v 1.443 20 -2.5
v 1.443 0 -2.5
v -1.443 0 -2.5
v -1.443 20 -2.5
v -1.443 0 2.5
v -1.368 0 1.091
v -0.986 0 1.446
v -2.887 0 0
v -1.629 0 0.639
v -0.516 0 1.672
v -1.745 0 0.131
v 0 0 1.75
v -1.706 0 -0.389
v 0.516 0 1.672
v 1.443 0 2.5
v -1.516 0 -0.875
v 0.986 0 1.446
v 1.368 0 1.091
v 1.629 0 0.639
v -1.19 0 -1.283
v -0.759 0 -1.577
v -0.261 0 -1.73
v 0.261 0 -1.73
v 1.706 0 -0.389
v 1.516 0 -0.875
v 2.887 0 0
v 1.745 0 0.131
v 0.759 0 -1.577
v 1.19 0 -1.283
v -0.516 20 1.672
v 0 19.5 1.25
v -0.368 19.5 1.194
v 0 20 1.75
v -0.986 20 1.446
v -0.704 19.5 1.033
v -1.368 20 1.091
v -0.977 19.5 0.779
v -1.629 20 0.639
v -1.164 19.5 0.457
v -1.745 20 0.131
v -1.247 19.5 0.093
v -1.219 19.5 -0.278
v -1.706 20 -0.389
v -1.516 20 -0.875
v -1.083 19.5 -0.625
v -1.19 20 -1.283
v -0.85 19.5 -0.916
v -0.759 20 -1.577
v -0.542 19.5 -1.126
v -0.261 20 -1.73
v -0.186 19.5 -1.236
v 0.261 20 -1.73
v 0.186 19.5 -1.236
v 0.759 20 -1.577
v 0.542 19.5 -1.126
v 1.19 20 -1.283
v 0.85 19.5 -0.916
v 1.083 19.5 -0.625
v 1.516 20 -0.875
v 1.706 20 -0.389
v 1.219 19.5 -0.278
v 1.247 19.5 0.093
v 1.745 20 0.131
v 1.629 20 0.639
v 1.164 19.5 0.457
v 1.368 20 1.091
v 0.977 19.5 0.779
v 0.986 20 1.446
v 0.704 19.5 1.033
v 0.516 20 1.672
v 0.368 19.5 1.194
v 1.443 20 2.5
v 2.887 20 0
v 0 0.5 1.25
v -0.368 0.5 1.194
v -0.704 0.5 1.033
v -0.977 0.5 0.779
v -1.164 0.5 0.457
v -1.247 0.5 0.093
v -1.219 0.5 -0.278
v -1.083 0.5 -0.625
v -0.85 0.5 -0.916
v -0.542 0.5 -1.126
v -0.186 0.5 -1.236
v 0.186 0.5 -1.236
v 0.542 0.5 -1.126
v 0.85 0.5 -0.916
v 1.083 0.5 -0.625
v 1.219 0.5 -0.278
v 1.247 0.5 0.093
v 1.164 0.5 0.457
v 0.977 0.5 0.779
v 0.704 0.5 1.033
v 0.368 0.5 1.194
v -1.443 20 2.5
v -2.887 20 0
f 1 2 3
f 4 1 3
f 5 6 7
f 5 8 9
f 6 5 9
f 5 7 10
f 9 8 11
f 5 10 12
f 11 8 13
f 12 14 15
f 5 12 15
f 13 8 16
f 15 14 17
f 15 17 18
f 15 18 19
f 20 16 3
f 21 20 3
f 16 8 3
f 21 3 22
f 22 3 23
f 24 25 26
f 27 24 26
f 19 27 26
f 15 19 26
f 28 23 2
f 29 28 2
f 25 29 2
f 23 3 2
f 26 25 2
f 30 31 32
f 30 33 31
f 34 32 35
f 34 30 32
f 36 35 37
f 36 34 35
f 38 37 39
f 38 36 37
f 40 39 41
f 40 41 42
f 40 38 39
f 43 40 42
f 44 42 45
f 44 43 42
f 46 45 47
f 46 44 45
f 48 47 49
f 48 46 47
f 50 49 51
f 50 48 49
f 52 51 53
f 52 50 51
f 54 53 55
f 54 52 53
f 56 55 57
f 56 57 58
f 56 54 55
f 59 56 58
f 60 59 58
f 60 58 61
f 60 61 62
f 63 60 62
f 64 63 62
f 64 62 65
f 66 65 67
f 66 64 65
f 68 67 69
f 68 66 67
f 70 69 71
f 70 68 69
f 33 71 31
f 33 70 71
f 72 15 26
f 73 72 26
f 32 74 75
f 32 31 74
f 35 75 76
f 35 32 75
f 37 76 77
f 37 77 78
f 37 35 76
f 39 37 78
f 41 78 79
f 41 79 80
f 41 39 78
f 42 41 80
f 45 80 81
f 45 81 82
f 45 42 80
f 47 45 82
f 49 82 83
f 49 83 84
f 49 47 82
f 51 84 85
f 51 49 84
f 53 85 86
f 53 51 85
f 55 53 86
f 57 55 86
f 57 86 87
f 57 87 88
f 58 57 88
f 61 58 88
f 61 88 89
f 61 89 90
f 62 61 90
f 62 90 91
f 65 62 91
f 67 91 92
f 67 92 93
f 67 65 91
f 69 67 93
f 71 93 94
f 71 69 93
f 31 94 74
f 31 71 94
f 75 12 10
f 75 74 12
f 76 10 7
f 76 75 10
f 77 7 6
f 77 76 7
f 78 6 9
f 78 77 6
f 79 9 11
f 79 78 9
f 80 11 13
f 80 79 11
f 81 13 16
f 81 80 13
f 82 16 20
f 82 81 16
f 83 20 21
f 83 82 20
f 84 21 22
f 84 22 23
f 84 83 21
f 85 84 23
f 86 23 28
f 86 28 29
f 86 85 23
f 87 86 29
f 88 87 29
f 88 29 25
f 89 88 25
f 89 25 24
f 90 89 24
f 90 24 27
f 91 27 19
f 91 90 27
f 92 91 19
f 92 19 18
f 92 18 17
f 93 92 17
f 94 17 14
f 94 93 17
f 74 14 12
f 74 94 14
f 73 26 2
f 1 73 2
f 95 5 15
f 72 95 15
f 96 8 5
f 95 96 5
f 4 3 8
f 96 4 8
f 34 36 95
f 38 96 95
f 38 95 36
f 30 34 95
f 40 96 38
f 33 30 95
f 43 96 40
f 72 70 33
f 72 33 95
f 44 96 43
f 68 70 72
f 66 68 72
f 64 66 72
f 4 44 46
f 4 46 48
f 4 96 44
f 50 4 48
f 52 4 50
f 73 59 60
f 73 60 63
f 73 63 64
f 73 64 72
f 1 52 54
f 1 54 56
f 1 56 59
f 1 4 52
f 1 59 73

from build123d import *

# Parameters (mm, degrees)
EXTRUDE_1_DEPTH = 20


with BuildPart() as part:
    # Эскиз1 → Бобышка-Вытянуть1 (new body)
    with BuildSketch(Plane(origin=(0, 0, 0), x_dir=(1, 0, 0), z_dir=(0, 1, 0))):
        Polygon((2.886751346, 0), (1.443375673, 2.5), (-1.443375673, 2.5), (-2.886751346, 0), (-1.443375673, -2.5), (1.443375673, -2.5), align=None)
    extrude(amount=EXTRUDE_1_DEPTH)

    # Эскиз2 → Отверстие обработанное метчиком M3x0.51 (revolve, cut)
    with BuildSketch(Plane(origin=(0, 20, 0), x_dir=(0, 0, 1), z_dir=(1, 0, 0))):
        Polygon((0, 0), (0, 20), (1.75, 20), (1.25, 19.5), (1.25, 0.5), (1.75, 0), align=None)
    revolve(axis=Axis((0, 26.35, 0), (0, -1, 0)), mode=Mode.SUBTRACT)


solid = part.part
